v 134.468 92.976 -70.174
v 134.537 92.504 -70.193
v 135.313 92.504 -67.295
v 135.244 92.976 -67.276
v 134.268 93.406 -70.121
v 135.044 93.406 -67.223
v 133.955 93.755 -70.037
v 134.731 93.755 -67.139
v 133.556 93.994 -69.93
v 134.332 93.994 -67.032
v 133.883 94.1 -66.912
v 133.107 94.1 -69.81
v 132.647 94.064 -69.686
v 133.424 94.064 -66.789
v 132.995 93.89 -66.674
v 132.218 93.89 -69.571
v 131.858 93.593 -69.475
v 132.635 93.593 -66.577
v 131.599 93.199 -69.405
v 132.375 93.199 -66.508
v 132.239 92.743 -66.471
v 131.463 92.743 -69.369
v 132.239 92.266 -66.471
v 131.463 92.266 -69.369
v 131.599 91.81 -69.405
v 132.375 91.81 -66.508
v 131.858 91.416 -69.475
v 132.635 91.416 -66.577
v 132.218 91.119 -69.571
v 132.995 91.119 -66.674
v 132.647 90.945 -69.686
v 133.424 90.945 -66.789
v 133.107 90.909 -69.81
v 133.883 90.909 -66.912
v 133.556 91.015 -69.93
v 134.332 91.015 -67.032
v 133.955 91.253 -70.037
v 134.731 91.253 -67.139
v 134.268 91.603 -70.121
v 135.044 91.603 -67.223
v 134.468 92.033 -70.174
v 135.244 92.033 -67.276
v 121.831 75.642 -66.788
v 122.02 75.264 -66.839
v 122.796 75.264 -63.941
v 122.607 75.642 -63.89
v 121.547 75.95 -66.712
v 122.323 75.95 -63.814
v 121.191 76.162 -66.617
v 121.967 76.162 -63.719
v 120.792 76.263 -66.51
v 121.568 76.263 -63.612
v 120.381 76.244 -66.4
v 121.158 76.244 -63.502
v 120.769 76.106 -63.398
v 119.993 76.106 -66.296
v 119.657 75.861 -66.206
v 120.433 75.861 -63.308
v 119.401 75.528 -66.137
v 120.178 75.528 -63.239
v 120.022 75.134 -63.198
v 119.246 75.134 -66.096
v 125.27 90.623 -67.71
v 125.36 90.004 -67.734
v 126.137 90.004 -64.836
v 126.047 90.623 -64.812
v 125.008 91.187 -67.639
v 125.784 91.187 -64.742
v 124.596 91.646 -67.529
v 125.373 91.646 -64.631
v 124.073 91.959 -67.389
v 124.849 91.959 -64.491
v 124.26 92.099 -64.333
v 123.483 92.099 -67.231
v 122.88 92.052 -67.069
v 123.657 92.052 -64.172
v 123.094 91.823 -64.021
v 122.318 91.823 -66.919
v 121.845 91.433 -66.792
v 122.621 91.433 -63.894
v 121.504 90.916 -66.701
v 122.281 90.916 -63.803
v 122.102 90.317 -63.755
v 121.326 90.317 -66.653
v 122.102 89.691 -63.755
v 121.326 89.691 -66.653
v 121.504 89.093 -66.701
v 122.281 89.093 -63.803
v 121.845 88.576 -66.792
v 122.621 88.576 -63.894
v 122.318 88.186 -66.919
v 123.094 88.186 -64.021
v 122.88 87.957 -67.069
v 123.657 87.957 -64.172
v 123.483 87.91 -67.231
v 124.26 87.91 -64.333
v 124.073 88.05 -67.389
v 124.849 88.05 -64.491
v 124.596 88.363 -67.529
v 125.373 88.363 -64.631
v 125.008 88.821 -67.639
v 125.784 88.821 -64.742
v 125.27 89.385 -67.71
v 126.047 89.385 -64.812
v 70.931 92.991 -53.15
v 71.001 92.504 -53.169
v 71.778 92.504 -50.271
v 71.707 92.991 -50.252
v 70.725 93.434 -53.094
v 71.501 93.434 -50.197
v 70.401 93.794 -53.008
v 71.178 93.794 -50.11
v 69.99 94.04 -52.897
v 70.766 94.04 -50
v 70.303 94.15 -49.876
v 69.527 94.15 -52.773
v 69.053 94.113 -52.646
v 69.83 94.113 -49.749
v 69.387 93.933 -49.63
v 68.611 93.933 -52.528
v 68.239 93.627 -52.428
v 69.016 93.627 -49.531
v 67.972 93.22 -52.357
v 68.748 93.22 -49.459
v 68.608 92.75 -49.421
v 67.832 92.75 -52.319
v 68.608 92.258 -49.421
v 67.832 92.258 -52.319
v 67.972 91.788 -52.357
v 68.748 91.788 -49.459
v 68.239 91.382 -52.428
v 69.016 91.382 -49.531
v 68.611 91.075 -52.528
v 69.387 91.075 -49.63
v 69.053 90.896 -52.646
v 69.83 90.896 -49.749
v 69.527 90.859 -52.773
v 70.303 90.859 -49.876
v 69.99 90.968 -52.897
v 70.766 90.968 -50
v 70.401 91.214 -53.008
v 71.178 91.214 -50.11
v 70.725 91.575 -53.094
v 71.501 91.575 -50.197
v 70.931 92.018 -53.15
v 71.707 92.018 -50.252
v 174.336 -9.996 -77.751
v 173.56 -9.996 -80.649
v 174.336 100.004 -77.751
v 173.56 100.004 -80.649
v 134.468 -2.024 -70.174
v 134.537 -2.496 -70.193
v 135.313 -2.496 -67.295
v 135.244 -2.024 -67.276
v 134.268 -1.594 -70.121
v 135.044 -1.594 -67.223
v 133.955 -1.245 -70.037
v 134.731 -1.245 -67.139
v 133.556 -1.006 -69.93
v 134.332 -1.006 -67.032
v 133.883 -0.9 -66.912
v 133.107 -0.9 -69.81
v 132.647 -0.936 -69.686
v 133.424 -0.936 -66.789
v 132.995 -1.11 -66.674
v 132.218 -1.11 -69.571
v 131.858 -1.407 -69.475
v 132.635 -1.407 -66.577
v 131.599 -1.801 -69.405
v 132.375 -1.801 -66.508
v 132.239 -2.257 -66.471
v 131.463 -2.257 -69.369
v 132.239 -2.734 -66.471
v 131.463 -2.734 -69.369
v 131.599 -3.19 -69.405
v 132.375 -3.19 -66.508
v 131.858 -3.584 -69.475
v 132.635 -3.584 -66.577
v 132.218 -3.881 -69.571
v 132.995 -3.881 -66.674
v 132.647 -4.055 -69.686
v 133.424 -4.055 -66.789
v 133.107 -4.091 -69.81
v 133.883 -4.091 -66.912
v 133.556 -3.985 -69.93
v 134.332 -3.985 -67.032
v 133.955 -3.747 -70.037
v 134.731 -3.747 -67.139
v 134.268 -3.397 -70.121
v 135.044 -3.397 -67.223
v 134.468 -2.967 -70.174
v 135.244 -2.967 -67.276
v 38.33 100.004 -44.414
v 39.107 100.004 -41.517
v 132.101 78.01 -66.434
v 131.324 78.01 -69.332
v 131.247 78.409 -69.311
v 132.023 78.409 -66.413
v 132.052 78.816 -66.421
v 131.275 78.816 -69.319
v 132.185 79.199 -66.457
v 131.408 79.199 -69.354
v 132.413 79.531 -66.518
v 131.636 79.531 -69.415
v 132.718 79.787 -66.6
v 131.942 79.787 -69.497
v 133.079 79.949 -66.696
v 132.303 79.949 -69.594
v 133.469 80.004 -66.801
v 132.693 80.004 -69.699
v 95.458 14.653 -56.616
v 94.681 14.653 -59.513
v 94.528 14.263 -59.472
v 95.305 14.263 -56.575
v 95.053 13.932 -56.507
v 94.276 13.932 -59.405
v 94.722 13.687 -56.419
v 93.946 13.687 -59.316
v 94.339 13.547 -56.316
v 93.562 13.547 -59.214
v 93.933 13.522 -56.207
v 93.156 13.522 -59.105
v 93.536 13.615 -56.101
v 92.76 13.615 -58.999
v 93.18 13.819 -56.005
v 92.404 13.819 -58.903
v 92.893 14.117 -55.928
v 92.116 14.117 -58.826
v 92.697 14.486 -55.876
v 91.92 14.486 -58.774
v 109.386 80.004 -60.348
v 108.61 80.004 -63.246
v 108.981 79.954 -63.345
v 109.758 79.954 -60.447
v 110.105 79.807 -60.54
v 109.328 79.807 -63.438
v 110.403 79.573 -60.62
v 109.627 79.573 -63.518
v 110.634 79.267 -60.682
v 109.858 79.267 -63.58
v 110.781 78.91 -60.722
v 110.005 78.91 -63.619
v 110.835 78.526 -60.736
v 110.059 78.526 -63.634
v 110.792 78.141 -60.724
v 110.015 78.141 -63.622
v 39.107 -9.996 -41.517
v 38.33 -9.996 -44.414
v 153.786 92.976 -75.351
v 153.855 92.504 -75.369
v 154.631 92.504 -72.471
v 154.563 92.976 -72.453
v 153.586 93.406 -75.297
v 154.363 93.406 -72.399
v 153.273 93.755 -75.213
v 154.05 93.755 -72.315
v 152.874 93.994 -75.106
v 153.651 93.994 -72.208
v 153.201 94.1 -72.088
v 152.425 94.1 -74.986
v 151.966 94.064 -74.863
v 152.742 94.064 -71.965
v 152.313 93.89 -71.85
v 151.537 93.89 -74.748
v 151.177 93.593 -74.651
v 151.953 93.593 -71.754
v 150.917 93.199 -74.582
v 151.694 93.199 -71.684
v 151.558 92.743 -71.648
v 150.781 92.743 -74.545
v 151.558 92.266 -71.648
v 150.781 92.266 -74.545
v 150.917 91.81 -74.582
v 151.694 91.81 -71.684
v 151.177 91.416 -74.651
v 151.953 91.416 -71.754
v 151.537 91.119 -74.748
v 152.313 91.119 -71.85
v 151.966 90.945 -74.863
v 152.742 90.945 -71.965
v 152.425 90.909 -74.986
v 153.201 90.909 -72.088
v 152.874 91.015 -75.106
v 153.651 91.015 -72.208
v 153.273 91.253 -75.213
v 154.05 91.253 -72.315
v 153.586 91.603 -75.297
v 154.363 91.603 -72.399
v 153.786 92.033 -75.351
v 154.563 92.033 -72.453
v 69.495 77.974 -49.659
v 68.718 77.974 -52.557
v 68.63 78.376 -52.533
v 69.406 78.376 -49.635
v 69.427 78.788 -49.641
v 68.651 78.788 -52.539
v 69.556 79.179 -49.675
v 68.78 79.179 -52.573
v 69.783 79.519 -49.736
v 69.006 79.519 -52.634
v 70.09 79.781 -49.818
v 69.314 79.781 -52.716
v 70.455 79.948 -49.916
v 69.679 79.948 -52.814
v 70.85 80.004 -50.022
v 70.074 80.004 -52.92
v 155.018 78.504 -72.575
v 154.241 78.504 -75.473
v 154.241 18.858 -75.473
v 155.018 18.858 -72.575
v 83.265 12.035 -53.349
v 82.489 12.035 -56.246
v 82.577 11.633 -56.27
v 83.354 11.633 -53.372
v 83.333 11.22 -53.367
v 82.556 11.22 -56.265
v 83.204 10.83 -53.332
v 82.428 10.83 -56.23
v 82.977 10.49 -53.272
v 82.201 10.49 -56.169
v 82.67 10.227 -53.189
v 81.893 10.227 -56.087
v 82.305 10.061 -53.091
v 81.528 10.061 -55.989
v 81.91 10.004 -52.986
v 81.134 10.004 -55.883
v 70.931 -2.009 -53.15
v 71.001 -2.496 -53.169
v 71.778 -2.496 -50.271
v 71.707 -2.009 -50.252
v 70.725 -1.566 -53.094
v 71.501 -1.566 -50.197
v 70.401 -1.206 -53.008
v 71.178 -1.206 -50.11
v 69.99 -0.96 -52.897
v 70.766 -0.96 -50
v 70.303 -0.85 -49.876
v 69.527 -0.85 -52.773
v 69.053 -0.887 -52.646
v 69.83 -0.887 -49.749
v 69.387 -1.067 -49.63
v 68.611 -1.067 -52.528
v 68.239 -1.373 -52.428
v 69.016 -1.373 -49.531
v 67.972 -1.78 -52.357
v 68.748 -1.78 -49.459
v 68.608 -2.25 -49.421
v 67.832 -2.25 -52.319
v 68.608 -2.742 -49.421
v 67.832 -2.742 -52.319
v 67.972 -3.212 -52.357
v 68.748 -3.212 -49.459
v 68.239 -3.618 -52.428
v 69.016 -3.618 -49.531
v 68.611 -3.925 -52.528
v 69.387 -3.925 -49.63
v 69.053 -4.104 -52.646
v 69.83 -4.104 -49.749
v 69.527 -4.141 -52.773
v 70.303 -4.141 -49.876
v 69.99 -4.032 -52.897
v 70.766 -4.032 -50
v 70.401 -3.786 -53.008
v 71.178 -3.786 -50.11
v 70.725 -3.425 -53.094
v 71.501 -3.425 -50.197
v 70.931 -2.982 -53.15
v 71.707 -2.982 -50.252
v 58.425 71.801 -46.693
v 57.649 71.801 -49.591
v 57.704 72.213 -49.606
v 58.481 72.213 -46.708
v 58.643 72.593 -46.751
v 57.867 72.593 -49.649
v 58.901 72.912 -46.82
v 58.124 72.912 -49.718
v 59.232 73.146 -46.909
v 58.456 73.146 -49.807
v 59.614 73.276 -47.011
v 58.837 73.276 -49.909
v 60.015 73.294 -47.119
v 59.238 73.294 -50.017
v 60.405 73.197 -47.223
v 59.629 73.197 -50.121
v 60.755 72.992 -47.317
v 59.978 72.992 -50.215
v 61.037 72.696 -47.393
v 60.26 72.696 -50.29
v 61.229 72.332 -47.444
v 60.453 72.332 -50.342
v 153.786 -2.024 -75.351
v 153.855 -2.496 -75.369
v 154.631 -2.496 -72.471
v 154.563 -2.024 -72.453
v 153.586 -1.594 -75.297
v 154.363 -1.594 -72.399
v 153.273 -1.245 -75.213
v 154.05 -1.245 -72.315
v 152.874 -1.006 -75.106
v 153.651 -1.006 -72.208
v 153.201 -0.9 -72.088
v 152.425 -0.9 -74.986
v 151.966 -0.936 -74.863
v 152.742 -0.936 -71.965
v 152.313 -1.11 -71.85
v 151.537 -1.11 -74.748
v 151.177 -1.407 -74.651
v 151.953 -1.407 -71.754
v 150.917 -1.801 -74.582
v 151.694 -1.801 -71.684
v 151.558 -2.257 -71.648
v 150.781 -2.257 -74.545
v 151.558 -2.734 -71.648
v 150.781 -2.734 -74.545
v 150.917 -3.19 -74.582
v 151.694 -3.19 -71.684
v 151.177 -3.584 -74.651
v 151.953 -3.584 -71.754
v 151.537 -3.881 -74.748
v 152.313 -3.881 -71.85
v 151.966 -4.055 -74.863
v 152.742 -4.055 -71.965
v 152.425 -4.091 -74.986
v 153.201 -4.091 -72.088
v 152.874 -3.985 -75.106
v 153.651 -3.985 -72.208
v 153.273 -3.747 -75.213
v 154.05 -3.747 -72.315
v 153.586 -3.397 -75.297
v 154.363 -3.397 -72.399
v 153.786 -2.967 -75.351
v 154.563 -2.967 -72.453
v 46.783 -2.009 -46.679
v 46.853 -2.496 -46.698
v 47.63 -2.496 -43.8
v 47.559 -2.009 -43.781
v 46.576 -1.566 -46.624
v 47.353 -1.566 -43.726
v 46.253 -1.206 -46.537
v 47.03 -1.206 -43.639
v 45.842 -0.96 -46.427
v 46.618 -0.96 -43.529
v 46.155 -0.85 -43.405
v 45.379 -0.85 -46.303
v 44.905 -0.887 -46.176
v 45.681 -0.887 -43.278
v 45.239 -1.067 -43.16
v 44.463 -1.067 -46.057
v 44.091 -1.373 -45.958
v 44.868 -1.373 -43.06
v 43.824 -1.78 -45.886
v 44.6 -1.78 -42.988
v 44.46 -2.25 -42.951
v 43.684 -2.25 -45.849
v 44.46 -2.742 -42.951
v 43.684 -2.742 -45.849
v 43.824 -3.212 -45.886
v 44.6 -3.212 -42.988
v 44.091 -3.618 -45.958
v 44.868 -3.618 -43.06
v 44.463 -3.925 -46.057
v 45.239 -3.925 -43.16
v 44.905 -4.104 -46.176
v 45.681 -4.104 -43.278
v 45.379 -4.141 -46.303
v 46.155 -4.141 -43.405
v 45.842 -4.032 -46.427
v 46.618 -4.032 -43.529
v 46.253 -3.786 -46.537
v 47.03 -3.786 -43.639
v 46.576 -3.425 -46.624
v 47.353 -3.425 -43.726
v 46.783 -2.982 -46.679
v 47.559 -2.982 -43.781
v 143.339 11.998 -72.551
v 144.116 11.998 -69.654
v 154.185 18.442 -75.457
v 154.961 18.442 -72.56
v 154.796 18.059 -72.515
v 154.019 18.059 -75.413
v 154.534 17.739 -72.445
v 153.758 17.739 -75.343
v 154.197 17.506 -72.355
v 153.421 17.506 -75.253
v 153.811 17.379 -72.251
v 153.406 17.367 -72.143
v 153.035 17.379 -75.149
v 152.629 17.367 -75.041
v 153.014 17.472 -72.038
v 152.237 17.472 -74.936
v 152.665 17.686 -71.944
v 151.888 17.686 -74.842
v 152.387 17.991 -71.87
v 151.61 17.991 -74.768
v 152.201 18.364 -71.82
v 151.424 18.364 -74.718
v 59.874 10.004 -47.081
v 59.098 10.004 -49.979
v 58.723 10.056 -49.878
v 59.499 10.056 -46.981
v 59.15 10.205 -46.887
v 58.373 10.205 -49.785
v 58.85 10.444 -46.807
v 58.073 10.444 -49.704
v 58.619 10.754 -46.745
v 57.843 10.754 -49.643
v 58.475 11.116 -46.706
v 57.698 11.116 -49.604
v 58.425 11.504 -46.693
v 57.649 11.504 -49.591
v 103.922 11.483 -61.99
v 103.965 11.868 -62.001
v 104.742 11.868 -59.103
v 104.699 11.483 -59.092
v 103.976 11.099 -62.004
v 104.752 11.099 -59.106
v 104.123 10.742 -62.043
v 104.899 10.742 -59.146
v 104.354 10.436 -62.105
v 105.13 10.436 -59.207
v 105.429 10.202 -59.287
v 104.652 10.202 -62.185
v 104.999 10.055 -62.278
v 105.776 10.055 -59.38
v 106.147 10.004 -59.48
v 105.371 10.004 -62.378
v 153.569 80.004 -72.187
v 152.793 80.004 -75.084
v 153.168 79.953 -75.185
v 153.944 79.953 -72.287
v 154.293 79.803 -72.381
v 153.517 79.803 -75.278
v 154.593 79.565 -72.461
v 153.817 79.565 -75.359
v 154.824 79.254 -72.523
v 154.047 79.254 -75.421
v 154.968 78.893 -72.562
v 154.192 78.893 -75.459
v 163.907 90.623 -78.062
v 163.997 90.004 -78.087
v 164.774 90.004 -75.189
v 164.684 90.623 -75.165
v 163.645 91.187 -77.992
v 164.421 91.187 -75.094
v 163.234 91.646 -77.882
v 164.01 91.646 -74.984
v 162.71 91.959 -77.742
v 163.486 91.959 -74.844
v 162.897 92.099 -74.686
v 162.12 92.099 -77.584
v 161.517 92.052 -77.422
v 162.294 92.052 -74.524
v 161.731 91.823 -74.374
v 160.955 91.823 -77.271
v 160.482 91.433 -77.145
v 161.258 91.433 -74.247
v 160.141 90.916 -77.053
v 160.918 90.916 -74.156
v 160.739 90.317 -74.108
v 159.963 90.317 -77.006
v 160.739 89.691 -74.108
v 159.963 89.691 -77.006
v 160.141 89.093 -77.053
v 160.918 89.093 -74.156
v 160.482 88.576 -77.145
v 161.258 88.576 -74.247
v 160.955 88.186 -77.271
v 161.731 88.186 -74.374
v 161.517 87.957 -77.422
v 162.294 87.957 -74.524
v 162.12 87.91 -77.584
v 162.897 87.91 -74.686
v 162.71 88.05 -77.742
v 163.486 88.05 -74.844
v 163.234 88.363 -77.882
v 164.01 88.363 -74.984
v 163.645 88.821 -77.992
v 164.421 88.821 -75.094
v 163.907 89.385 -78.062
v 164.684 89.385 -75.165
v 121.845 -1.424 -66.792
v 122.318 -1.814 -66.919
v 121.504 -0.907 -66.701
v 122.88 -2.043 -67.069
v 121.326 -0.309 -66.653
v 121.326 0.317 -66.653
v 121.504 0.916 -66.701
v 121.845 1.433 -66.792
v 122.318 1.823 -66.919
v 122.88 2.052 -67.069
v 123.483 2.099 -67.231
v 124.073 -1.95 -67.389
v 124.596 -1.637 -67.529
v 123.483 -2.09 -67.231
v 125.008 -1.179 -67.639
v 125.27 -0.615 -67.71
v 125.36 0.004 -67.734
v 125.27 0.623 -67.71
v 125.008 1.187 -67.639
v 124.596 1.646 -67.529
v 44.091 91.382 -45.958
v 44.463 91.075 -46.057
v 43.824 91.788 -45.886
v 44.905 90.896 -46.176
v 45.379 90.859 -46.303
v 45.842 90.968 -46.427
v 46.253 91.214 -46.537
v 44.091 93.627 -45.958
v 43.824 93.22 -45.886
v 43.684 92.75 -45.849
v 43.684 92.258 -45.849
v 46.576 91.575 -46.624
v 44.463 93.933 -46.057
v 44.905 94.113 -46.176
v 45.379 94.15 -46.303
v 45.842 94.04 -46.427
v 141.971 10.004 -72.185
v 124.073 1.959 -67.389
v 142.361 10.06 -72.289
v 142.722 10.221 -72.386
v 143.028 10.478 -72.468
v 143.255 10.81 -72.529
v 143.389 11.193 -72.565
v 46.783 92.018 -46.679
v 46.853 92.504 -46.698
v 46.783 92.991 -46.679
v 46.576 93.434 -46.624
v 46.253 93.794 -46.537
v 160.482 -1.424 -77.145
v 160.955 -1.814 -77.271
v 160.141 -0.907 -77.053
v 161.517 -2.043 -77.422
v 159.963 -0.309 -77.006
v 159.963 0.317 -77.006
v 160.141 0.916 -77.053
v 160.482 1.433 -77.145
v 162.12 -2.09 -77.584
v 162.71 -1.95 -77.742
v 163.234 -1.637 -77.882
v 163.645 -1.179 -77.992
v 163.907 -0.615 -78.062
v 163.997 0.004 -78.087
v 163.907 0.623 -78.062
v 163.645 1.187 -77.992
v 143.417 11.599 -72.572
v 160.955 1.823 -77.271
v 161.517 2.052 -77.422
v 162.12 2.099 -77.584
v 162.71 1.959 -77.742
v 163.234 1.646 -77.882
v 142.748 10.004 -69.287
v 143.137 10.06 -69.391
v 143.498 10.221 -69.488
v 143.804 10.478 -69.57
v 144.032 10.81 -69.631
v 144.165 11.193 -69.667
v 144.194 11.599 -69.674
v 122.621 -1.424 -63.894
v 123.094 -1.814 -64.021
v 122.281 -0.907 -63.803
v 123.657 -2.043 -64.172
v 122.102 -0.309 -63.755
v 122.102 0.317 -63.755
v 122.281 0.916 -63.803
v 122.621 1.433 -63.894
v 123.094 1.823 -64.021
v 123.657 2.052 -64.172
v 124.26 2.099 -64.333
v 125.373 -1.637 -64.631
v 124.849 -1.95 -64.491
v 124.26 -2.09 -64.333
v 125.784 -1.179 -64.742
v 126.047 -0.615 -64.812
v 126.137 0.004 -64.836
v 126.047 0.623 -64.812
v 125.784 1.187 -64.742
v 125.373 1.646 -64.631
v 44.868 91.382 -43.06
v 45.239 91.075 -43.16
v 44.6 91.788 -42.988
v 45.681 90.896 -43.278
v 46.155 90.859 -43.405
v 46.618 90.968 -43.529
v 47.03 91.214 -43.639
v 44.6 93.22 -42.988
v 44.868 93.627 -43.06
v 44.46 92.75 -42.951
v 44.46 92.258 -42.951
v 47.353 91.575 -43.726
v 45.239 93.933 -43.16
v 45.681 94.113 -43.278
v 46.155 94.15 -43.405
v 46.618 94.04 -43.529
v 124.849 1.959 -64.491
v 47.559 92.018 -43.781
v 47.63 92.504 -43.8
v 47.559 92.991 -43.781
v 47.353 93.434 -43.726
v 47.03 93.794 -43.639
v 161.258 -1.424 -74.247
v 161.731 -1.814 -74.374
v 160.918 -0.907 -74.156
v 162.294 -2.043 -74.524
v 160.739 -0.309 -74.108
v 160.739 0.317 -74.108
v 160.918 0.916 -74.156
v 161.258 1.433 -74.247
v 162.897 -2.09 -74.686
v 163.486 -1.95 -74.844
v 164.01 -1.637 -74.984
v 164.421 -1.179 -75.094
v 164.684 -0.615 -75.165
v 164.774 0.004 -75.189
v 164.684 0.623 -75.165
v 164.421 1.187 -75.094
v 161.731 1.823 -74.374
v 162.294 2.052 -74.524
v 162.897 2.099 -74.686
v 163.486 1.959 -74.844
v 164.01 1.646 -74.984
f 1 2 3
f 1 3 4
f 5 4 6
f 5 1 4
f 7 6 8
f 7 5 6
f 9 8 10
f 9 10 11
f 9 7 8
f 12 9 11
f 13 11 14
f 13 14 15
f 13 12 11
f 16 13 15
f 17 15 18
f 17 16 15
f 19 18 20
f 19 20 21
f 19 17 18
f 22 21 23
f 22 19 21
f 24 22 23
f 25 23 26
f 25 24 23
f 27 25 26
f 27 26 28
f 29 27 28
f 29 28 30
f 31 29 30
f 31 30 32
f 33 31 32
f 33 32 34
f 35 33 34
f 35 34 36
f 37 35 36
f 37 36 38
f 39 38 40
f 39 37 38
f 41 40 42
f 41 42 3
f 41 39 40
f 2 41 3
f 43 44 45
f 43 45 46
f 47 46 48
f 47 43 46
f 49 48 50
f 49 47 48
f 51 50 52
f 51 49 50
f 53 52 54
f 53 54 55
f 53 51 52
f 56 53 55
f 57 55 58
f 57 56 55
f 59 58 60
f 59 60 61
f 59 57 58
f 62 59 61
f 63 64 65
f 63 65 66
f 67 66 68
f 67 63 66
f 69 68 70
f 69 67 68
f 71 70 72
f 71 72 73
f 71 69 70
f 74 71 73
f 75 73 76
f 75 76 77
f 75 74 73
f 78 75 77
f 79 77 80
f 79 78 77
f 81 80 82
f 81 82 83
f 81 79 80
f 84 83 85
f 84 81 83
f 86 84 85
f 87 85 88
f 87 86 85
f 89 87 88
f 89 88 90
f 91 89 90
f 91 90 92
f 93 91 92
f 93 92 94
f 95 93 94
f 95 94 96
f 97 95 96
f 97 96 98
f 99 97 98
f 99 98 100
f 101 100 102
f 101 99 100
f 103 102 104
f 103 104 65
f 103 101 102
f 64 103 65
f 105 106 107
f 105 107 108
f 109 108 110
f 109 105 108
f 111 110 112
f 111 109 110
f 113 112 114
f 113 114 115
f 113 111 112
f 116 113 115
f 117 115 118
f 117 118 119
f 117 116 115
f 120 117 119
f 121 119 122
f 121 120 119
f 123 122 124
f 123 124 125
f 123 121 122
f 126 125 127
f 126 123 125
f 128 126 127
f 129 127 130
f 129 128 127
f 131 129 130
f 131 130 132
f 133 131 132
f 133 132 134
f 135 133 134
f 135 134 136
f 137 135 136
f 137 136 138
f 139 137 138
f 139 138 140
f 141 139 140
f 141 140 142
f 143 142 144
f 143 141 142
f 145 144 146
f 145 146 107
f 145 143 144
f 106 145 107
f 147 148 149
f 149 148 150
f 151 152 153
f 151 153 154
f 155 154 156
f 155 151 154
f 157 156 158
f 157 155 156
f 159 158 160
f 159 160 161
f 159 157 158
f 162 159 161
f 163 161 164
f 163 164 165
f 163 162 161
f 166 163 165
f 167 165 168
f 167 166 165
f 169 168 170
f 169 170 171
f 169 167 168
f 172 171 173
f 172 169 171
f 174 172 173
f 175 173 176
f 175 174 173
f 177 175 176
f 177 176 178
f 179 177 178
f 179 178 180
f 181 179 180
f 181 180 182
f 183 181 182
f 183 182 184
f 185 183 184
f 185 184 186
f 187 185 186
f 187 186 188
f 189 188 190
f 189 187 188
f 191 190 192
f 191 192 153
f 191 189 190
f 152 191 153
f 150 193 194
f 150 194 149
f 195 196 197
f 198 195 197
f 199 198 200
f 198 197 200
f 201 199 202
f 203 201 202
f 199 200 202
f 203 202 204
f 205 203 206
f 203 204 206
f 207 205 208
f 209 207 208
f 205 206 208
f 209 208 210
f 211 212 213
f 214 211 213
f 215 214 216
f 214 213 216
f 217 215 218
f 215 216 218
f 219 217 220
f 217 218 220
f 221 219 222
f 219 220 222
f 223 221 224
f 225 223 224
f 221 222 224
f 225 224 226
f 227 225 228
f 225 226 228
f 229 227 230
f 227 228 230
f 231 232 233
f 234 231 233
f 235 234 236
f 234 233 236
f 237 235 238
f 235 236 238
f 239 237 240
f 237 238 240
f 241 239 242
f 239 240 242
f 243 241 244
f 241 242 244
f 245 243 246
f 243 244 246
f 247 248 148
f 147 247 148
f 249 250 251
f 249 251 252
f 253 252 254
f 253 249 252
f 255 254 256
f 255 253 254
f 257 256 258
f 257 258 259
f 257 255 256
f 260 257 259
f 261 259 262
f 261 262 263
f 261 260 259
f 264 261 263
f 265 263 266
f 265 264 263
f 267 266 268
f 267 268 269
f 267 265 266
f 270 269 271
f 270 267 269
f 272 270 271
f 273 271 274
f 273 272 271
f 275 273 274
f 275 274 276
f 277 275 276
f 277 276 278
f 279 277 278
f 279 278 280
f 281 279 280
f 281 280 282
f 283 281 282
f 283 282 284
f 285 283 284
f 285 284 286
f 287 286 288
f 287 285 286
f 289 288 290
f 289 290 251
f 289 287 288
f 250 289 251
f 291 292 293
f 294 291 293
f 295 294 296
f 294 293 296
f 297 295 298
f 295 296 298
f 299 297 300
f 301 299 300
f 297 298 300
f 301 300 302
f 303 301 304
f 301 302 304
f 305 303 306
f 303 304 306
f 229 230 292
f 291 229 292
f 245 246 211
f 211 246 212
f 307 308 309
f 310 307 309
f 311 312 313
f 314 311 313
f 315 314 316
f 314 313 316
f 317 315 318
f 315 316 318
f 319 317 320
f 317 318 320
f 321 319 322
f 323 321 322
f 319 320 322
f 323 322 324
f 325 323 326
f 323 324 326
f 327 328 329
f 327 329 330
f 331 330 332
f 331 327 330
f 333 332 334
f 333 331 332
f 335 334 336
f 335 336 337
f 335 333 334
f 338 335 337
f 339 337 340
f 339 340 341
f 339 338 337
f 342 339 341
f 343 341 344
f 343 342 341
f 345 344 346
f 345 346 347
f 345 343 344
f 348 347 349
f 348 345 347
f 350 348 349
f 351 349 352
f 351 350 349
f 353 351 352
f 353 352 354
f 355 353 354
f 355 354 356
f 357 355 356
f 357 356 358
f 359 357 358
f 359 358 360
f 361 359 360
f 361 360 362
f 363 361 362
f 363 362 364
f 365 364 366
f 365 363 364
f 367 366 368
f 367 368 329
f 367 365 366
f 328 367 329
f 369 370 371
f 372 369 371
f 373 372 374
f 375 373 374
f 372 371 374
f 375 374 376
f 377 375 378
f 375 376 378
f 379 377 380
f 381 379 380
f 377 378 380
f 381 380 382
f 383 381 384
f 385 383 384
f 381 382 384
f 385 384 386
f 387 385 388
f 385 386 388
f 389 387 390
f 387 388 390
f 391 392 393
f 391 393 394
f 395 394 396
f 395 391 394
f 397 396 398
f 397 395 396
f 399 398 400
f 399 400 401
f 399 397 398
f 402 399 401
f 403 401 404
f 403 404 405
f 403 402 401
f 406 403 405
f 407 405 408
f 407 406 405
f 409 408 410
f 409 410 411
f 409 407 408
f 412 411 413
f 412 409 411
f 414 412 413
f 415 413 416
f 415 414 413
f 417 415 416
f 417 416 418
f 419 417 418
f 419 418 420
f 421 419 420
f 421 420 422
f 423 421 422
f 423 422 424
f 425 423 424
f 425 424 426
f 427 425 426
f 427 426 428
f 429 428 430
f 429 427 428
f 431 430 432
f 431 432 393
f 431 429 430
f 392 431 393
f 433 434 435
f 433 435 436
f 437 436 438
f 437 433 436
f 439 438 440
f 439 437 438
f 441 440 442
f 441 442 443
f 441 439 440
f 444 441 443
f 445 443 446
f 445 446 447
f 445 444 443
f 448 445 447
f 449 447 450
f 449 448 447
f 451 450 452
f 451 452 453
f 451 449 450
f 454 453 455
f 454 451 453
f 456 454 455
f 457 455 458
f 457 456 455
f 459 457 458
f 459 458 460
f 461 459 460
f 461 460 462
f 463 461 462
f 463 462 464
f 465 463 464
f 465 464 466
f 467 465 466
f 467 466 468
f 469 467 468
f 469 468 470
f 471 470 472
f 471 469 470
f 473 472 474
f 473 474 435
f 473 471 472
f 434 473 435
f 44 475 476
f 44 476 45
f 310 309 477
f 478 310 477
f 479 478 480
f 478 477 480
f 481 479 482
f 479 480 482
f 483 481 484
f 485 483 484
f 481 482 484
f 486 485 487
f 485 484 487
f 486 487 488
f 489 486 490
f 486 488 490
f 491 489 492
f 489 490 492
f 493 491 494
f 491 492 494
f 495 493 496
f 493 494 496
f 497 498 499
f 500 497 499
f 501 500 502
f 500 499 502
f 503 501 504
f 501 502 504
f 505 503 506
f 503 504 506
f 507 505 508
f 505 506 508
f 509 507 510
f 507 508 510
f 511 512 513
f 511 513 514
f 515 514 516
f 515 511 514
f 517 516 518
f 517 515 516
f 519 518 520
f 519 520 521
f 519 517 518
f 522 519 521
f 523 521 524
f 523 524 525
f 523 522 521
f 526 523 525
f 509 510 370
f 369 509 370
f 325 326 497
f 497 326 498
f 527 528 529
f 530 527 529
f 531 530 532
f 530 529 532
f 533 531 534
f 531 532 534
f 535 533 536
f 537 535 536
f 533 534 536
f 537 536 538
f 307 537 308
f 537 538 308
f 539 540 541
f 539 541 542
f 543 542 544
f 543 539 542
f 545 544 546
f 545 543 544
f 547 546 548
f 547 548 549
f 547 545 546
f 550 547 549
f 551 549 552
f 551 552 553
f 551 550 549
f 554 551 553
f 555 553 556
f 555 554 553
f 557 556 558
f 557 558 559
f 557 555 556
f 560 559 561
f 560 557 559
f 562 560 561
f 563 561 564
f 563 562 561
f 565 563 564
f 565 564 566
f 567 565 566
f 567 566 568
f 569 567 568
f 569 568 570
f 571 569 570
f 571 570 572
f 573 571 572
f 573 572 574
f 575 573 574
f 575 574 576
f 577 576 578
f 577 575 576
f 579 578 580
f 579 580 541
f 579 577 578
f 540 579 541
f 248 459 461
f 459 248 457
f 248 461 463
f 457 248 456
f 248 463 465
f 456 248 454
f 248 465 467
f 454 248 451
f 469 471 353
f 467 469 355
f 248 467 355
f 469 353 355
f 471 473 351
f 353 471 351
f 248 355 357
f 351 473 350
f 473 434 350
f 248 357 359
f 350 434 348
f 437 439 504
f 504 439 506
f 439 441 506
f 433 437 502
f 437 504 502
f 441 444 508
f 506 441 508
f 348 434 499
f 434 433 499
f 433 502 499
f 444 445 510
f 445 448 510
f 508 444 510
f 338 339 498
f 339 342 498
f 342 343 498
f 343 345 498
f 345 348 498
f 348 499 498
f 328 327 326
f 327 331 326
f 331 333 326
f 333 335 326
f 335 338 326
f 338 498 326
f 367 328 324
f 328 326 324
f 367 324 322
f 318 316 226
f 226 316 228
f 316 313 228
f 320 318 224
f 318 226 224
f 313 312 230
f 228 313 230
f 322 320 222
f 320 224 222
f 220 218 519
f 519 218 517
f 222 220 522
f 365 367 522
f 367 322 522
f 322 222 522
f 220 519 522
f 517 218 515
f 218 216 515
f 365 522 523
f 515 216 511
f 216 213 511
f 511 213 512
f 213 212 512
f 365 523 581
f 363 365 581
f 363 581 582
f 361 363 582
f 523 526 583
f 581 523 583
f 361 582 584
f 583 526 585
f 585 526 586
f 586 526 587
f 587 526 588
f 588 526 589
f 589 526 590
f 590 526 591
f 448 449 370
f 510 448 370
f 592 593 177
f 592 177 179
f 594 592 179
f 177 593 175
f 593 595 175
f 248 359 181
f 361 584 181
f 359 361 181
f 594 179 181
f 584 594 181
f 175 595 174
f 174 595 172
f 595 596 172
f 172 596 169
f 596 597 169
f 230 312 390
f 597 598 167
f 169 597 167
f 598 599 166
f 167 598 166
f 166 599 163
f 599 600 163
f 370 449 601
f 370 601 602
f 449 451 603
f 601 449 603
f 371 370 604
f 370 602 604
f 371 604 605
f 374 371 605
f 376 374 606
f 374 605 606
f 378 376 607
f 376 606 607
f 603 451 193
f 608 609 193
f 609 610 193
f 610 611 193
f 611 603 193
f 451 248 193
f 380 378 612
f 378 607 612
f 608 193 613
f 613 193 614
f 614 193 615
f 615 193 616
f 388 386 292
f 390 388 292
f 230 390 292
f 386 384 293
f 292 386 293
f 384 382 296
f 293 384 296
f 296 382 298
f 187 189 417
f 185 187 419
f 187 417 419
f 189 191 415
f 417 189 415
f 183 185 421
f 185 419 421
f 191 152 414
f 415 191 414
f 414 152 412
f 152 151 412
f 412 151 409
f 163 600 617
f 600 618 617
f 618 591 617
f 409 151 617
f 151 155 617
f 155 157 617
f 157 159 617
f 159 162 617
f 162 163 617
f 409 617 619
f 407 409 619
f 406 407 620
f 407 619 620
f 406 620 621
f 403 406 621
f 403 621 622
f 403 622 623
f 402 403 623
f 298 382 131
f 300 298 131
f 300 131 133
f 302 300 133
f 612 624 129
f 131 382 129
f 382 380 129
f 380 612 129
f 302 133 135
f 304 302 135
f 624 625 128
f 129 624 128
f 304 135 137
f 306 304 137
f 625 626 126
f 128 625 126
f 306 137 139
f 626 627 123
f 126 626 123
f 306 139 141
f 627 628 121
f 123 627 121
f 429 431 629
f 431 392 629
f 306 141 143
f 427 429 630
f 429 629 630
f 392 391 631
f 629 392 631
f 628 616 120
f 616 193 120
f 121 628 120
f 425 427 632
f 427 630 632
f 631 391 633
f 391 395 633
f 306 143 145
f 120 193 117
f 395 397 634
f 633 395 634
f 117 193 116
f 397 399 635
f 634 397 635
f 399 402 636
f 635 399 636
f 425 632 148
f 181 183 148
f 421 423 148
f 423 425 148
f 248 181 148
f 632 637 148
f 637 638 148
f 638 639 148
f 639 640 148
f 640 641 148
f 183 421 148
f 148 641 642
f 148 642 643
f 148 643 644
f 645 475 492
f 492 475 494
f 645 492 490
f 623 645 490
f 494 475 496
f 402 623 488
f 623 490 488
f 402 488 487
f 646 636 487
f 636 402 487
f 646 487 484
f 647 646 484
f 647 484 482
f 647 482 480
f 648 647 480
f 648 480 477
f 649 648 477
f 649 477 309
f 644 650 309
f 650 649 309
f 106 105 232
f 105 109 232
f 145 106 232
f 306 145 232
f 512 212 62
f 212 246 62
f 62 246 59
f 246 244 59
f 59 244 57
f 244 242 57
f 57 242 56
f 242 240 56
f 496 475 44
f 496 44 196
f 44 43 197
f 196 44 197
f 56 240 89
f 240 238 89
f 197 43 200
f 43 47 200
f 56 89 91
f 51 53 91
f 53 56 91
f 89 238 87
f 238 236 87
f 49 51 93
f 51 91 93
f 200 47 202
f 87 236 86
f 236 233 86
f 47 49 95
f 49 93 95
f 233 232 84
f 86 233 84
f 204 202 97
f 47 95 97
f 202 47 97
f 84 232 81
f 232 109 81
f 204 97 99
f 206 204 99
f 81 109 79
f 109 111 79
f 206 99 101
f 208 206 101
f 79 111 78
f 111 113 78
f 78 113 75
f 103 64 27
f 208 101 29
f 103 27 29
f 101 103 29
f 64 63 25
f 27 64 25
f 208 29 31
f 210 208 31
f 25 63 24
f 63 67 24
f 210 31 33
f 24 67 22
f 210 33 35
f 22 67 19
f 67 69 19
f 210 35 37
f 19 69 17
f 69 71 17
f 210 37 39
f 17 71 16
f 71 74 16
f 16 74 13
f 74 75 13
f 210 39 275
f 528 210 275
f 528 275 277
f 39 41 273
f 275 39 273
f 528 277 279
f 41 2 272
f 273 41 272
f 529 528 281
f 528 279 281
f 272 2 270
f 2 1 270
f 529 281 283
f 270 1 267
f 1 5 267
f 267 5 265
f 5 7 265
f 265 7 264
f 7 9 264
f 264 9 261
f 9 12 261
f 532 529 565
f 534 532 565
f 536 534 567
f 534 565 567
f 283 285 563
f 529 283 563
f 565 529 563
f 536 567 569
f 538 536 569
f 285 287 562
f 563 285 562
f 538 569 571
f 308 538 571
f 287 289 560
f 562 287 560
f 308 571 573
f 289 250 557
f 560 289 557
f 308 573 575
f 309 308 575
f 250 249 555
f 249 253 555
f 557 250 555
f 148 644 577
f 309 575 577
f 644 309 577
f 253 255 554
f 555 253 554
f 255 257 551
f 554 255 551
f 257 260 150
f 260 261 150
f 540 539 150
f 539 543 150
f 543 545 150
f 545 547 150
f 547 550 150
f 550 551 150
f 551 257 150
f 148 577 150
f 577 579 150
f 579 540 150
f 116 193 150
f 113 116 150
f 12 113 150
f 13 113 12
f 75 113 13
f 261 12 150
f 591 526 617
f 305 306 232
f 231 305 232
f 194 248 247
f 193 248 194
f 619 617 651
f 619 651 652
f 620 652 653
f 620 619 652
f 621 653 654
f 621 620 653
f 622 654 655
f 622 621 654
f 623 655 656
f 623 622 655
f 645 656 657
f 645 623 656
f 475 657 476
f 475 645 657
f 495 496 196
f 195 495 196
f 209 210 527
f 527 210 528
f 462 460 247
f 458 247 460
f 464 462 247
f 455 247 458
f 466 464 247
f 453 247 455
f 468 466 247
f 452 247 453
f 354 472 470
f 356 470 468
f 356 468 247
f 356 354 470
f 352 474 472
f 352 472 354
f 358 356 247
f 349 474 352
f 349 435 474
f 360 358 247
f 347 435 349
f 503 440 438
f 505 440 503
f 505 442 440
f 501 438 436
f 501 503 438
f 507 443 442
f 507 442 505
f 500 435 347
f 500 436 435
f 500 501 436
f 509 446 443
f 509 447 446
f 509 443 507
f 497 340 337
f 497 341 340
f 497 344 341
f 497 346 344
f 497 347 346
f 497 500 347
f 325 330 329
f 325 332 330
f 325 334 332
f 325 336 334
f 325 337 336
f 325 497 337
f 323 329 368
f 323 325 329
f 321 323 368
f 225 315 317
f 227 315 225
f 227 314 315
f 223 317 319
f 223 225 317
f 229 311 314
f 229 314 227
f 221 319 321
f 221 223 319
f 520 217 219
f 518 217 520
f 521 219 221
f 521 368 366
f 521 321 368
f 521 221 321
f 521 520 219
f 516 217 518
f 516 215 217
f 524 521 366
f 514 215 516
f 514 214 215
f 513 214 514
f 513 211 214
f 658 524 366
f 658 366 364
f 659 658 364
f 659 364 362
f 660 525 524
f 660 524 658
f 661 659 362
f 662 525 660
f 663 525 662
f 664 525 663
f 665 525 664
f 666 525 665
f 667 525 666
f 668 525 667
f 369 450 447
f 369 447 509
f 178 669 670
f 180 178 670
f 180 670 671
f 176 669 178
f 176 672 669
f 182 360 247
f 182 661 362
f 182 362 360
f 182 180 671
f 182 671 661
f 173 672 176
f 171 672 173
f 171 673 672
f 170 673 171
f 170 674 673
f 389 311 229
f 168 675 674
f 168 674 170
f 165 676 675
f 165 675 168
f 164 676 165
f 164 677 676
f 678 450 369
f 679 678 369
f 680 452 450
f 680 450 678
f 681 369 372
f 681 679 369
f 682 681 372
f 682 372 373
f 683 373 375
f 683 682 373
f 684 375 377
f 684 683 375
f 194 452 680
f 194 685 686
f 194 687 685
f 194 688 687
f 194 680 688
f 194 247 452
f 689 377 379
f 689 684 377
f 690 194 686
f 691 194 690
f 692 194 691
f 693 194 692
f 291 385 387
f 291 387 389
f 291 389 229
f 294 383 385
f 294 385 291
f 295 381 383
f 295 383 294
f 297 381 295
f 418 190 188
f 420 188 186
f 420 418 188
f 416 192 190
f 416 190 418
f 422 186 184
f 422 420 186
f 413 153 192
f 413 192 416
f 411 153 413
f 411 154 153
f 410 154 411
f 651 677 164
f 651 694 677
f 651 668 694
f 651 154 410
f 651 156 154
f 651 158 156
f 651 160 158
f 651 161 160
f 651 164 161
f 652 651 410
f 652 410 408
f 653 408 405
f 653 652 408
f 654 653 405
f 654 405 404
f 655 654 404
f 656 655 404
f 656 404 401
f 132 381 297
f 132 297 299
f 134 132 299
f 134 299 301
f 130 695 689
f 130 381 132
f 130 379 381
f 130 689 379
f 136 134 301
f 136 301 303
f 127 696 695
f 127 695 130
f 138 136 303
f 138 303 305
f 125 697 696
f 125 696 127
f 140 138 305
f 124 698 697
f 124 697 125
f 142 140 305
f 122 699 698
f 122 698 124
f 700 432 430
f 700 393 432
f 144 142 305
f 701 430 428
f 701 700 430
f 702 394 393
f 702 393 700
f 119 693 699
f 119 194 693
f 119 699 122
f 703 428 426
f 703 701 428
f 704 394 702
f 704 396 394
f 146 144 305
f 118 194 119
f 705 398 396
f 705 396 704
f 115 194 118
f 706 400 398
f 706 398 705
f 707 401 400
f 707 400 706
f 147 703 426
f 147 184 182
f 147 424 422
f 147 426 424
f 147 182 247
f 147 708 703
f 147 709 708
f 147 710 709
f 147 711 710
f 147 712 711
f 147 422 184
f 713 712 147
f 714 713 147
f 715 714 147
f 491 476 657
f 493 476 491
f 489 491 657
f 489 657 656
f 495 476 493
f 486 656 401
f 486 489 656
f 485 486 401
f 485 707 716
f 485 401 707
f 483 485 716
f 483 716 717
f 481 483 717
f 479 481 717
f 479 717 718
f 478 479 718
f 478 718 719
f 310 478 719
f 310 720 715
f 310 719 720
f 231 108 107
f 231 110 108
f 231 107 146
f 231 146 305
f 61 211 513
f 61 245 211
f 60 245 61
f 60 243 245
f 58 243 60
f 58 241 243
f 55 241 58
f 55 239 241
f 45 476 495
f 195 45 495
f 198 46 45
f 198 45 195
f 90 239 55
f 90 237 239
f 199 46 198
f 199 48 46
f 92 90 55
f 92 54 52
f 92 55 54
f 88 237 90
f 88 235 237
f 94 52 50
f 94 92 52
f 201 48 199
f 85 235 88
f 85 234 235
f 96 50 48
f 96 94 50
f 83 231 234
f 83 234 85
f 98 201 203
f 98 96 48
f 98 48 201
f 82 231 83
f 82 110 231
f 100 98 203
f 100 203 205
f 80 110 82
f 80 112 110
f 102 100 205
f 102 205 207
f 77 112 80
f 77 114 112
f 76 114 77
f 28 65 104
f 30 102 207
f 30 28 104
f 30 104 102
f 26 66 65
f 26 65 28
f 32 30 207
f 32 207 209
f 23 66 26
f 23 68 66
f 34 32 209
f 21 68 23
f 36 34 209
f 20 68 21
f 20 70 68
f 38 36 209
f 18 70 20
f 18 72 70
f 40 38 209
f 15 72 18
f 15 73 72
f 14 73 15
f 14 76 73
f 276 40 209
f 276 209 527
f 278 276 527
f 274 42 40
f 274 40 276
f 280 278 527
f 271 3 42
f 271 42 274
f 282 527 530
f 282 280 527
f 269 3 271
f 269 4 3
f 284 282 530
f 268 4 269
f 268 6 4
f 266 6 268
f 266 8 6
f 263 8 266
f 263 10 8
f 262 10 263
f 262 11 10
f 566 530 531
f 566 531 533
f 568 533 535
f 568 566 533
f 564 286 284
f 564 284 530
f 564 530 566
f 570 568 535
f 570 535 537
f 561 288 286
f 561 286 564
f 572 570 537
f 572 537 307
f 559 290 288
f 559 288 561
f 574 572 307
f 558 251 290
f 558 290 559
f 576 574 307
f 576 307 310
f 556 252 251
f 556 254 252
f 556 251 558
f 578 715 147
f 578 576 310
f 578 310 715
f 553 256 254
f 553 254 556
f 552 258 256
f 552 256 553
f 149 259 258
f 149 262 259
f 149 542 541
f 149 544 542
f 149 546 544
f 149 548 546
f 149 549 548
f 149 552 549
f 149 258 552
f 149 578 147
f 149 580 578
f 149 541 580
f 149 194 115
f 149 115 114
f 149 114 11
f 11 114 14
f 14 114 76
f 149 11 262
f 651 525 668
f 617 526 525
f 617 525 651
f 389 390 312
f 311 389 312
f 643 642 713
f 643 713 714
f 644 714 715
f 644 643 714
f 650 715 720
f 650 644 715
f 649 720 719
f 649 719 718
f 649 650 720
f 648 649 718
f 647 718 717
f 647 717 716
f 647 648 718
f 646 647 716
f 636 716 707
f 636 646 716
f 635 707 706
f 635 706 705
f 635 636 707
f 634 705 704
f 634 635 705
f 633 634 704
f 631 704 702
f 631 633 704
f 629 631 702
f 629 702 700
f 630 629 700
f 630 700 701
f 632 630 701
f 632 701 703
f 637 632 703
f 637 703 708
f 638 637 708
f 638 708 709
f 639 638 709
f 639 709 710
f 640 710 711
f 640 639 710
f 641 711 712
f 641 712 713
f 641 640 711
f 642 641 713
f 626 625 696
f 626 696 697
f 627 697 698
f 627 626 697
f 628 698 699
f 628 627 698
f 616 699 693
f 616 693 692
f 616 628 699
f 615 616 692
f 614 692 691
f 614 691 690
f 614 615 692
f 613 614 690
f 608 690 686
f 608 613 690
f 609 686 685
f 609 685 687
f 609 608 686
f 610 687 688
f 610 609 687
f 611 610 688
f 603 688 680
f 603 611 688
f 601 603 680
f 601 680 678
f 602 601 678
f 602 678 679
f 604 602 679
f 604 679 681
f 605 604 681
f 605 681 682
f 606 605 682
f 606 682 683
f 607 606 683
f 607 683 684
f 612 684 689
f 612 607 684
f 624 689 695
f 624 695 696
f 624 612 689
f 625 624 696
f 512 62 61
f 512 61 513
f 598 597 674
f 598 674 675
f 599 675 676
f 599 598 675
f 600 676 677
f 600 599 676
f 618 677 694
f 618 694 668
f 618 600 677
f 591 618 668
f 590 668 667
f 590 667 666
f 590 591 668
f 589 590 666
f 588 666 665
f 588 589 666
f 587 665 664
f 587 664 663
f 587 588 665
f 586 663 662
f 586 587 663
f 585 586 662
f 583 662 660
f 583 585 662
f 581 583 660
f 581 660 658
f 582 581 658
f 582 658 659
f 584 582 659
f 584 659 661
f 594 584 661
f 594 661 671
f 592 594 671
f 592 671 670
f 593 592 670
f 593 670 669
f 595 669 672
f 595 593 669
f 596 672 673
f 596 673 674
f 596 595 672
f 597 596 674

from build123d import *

# Parameters (mm, degrees)
SKETCH2_W      = 140
SKETCH2_H      = 110
SKETCH2_R      = 1.6
SKETCH2_R_2    = 2.1
EXTRUDE1_DEPTH = 3


with BuildPart() as part:
    # Sketch2 → Extrude1 (new body)
    with BuildSketch(Plane(origin=(-8.535929163, 0, -31.856521324), x_dir=(0.9659258262890755, 0, -0.2588190451024938), z_dir=(0.2588190451024938, 0, 0.9659258262890756))):
        with Locations((118.519484346, 45.004395502)):
            Rectangle(SKETCH2_W, SKETCH2_H)
        with Locations((166.519484346, 92.504395502)):
            Circle(SKETCH2_R, mode=Mode.SUBTRACT)
        with Locations((146.519484346, 92.504395502)):
            Circle(SKETCH2_R, mode=Mode.SUBTRACT)
        with Locations((146.519484346, -2.495604498)):
            Circle(SKETCH2_R, mode=Mode.SUBTRACT)
        with Locations((166.519484346, -2.495604498)):
            Circle(SKETCH2_R, mode=Mode.SUBTRACT)
        with Locations((176.519484346, 0.004395502)):
            Circle(SKETCH2_R_2, mode=Mode.SUBTRACT)
        with Locations((136.519484346, 0.004395502)):
            Circle(SKETCH2_R_2, mode=Mode.SUBTRACT)
        with Locations((176.519484346, 90.004395502)):
            Circle(SKETCH2_R_2, mode=Mode.SUBTRACT)
        with Locations((136.519484346, 90.004395502)):
            Circle(SKETCH2_R_2, mode=Mode.SUBTRACT)
        with BuildLine():
            Line((71.422427124, 72.331747658), (94.235598815, 12.035198256))
            ThreePointArc((94.235598815, 12.035198256), (94.06679625, 10.651812407), (92.832656037, 10.004395502))
            Line((92.832656037, 10.004395502), (70.019484346, 10.004395502))
            ThreePointArc((70.019484346, 10.004395502), (68.958824174, 10.44373533), (68.519484346, 11.504395502))
            Line((68.519484346, 11.504395502), (68.519484346, 71.800944904))
            ThreePointArc((68.519484346, 71.800944904), (69.749682721, 73.276481106), (71.422427124, 72.331747658))
        make_face(mode=Mode.SUBTRACT)
        with BuildLine():
            Line((81.382592108, 80.004395502), (121.278221323, 80.004395502))
            ThreePointArc((121.278221323, 80.004395502), (122.460552573, 79.427484239), (122.73341687, 78.140519257))
            Line((122.73341687, 78.140519257), (106.858201548, 14.653157981))
            ThreePointArc((106.858201548, 14.653157981), (105.490462864, 13.519585964), (104.000063225, 14.486231472))
            Line((104.000063225, 14.486231472), (79.979649331, 77.973592748))
            ThreePointArc((79.979649331, 77.973592748), (80.148451895, 79.356978598), (81.382592108, 80.004395502))
        make_face(mode=Mode.SUBTRACT)
        with BuildLine():
            Line((168.519484346, 78.504395502), (168.519484346, 18.857688255))
            ThreePointArc((168.519484346, 18.857688255), (167.270056066, 17.378765061), (165.603199262, 18.363586484))
            Line((165.603199262, 18.363586484), (144.794151706, 78.010293731))
            ThreePointArc((144.794151706, 78.010293731), (144.987499209, 79.372971159), (146.210436791, 80.004395502))
            Line((146.210436791, 80.004395502), (167.019484346, 80.004395502))
            ThreePointArc((167.019484346, 80.004395502), (168.080144518, 79.565055674), (168.519484346, 78.504395502))
        make_face(mode=Mode.SUBTRACT)
        with BuildLine():
            Line((132.289557089, 75.134147375), (116.469724954, 11.868271747))
            ThreePointArc((116.469724954, 11.868271747), (116.742589251, 10.581306765), (117.924920501, 10.004395502))
            Line((117.924920501, 10.004395502), (155.81642558, 10.004395502))
            ThreePointArc((155.81642558, 10.004395502), (157.039363161, 10.635819845), (157.232710664, 11.998497273))
            Line((157.232710664, 11.998497273), (135.16103772, 75.2643729))
            ThreePointArc((135.16103772, 75.2643729), (133.676795459, 76.268730946), (132.289557089, 75.134147375))
        make_face(mode=Mode.SUBTRACT)
        with BuildLine():
            ThreePointArc((54.043190493, -2.495604498), (55.693190493, -4.145604498), (57.343190493, -2.495604498))
            ThreePointArc((57.343190493, -2.495604498), (55.693190493, -0.845604498), (54.043190493, -2.495604498))
        make_face(mode=Mode.SUBTRACT)
        with BuildLine():
            ThreePointArc((79.043190493, -2.495604498), (80.693190493, -4.145604498), (82.343190493, -2.495604498))
            ThreePointArc((82.343190493, -2.495604498), (80.693190493, -0.845604498), (79.043190493, -2.495604498))
        make_face(mode=Mode.SUBTRACT)
        with BuildLine():
            ThreePointArc((79.043190493, 92.504395502), (80.693190493, 90.854395502), (82.343190493, 92.504395502))
            ThreePointArc((82.343190493, 92.504395502), (80.693190493, 94.154395502), (79.043190493, 92.504395502))
        make_face(mode=Mode.SUBTRACT)
        with BuildLine():
            ThreePointArc((54.043190493, 92.504395502), (55.693190493, 90.854395502), (57.343190493, 92.504395502))
            ThreePointArc((57.343190493, 92.504395502), (55.693190493, 94.154395502), (54.043190493, 92.504395502))
        make_face(mode=Mode.SUBTRACT)
    extrude(amount=EXTRUDE1_DEPTH)


solid = part.part
